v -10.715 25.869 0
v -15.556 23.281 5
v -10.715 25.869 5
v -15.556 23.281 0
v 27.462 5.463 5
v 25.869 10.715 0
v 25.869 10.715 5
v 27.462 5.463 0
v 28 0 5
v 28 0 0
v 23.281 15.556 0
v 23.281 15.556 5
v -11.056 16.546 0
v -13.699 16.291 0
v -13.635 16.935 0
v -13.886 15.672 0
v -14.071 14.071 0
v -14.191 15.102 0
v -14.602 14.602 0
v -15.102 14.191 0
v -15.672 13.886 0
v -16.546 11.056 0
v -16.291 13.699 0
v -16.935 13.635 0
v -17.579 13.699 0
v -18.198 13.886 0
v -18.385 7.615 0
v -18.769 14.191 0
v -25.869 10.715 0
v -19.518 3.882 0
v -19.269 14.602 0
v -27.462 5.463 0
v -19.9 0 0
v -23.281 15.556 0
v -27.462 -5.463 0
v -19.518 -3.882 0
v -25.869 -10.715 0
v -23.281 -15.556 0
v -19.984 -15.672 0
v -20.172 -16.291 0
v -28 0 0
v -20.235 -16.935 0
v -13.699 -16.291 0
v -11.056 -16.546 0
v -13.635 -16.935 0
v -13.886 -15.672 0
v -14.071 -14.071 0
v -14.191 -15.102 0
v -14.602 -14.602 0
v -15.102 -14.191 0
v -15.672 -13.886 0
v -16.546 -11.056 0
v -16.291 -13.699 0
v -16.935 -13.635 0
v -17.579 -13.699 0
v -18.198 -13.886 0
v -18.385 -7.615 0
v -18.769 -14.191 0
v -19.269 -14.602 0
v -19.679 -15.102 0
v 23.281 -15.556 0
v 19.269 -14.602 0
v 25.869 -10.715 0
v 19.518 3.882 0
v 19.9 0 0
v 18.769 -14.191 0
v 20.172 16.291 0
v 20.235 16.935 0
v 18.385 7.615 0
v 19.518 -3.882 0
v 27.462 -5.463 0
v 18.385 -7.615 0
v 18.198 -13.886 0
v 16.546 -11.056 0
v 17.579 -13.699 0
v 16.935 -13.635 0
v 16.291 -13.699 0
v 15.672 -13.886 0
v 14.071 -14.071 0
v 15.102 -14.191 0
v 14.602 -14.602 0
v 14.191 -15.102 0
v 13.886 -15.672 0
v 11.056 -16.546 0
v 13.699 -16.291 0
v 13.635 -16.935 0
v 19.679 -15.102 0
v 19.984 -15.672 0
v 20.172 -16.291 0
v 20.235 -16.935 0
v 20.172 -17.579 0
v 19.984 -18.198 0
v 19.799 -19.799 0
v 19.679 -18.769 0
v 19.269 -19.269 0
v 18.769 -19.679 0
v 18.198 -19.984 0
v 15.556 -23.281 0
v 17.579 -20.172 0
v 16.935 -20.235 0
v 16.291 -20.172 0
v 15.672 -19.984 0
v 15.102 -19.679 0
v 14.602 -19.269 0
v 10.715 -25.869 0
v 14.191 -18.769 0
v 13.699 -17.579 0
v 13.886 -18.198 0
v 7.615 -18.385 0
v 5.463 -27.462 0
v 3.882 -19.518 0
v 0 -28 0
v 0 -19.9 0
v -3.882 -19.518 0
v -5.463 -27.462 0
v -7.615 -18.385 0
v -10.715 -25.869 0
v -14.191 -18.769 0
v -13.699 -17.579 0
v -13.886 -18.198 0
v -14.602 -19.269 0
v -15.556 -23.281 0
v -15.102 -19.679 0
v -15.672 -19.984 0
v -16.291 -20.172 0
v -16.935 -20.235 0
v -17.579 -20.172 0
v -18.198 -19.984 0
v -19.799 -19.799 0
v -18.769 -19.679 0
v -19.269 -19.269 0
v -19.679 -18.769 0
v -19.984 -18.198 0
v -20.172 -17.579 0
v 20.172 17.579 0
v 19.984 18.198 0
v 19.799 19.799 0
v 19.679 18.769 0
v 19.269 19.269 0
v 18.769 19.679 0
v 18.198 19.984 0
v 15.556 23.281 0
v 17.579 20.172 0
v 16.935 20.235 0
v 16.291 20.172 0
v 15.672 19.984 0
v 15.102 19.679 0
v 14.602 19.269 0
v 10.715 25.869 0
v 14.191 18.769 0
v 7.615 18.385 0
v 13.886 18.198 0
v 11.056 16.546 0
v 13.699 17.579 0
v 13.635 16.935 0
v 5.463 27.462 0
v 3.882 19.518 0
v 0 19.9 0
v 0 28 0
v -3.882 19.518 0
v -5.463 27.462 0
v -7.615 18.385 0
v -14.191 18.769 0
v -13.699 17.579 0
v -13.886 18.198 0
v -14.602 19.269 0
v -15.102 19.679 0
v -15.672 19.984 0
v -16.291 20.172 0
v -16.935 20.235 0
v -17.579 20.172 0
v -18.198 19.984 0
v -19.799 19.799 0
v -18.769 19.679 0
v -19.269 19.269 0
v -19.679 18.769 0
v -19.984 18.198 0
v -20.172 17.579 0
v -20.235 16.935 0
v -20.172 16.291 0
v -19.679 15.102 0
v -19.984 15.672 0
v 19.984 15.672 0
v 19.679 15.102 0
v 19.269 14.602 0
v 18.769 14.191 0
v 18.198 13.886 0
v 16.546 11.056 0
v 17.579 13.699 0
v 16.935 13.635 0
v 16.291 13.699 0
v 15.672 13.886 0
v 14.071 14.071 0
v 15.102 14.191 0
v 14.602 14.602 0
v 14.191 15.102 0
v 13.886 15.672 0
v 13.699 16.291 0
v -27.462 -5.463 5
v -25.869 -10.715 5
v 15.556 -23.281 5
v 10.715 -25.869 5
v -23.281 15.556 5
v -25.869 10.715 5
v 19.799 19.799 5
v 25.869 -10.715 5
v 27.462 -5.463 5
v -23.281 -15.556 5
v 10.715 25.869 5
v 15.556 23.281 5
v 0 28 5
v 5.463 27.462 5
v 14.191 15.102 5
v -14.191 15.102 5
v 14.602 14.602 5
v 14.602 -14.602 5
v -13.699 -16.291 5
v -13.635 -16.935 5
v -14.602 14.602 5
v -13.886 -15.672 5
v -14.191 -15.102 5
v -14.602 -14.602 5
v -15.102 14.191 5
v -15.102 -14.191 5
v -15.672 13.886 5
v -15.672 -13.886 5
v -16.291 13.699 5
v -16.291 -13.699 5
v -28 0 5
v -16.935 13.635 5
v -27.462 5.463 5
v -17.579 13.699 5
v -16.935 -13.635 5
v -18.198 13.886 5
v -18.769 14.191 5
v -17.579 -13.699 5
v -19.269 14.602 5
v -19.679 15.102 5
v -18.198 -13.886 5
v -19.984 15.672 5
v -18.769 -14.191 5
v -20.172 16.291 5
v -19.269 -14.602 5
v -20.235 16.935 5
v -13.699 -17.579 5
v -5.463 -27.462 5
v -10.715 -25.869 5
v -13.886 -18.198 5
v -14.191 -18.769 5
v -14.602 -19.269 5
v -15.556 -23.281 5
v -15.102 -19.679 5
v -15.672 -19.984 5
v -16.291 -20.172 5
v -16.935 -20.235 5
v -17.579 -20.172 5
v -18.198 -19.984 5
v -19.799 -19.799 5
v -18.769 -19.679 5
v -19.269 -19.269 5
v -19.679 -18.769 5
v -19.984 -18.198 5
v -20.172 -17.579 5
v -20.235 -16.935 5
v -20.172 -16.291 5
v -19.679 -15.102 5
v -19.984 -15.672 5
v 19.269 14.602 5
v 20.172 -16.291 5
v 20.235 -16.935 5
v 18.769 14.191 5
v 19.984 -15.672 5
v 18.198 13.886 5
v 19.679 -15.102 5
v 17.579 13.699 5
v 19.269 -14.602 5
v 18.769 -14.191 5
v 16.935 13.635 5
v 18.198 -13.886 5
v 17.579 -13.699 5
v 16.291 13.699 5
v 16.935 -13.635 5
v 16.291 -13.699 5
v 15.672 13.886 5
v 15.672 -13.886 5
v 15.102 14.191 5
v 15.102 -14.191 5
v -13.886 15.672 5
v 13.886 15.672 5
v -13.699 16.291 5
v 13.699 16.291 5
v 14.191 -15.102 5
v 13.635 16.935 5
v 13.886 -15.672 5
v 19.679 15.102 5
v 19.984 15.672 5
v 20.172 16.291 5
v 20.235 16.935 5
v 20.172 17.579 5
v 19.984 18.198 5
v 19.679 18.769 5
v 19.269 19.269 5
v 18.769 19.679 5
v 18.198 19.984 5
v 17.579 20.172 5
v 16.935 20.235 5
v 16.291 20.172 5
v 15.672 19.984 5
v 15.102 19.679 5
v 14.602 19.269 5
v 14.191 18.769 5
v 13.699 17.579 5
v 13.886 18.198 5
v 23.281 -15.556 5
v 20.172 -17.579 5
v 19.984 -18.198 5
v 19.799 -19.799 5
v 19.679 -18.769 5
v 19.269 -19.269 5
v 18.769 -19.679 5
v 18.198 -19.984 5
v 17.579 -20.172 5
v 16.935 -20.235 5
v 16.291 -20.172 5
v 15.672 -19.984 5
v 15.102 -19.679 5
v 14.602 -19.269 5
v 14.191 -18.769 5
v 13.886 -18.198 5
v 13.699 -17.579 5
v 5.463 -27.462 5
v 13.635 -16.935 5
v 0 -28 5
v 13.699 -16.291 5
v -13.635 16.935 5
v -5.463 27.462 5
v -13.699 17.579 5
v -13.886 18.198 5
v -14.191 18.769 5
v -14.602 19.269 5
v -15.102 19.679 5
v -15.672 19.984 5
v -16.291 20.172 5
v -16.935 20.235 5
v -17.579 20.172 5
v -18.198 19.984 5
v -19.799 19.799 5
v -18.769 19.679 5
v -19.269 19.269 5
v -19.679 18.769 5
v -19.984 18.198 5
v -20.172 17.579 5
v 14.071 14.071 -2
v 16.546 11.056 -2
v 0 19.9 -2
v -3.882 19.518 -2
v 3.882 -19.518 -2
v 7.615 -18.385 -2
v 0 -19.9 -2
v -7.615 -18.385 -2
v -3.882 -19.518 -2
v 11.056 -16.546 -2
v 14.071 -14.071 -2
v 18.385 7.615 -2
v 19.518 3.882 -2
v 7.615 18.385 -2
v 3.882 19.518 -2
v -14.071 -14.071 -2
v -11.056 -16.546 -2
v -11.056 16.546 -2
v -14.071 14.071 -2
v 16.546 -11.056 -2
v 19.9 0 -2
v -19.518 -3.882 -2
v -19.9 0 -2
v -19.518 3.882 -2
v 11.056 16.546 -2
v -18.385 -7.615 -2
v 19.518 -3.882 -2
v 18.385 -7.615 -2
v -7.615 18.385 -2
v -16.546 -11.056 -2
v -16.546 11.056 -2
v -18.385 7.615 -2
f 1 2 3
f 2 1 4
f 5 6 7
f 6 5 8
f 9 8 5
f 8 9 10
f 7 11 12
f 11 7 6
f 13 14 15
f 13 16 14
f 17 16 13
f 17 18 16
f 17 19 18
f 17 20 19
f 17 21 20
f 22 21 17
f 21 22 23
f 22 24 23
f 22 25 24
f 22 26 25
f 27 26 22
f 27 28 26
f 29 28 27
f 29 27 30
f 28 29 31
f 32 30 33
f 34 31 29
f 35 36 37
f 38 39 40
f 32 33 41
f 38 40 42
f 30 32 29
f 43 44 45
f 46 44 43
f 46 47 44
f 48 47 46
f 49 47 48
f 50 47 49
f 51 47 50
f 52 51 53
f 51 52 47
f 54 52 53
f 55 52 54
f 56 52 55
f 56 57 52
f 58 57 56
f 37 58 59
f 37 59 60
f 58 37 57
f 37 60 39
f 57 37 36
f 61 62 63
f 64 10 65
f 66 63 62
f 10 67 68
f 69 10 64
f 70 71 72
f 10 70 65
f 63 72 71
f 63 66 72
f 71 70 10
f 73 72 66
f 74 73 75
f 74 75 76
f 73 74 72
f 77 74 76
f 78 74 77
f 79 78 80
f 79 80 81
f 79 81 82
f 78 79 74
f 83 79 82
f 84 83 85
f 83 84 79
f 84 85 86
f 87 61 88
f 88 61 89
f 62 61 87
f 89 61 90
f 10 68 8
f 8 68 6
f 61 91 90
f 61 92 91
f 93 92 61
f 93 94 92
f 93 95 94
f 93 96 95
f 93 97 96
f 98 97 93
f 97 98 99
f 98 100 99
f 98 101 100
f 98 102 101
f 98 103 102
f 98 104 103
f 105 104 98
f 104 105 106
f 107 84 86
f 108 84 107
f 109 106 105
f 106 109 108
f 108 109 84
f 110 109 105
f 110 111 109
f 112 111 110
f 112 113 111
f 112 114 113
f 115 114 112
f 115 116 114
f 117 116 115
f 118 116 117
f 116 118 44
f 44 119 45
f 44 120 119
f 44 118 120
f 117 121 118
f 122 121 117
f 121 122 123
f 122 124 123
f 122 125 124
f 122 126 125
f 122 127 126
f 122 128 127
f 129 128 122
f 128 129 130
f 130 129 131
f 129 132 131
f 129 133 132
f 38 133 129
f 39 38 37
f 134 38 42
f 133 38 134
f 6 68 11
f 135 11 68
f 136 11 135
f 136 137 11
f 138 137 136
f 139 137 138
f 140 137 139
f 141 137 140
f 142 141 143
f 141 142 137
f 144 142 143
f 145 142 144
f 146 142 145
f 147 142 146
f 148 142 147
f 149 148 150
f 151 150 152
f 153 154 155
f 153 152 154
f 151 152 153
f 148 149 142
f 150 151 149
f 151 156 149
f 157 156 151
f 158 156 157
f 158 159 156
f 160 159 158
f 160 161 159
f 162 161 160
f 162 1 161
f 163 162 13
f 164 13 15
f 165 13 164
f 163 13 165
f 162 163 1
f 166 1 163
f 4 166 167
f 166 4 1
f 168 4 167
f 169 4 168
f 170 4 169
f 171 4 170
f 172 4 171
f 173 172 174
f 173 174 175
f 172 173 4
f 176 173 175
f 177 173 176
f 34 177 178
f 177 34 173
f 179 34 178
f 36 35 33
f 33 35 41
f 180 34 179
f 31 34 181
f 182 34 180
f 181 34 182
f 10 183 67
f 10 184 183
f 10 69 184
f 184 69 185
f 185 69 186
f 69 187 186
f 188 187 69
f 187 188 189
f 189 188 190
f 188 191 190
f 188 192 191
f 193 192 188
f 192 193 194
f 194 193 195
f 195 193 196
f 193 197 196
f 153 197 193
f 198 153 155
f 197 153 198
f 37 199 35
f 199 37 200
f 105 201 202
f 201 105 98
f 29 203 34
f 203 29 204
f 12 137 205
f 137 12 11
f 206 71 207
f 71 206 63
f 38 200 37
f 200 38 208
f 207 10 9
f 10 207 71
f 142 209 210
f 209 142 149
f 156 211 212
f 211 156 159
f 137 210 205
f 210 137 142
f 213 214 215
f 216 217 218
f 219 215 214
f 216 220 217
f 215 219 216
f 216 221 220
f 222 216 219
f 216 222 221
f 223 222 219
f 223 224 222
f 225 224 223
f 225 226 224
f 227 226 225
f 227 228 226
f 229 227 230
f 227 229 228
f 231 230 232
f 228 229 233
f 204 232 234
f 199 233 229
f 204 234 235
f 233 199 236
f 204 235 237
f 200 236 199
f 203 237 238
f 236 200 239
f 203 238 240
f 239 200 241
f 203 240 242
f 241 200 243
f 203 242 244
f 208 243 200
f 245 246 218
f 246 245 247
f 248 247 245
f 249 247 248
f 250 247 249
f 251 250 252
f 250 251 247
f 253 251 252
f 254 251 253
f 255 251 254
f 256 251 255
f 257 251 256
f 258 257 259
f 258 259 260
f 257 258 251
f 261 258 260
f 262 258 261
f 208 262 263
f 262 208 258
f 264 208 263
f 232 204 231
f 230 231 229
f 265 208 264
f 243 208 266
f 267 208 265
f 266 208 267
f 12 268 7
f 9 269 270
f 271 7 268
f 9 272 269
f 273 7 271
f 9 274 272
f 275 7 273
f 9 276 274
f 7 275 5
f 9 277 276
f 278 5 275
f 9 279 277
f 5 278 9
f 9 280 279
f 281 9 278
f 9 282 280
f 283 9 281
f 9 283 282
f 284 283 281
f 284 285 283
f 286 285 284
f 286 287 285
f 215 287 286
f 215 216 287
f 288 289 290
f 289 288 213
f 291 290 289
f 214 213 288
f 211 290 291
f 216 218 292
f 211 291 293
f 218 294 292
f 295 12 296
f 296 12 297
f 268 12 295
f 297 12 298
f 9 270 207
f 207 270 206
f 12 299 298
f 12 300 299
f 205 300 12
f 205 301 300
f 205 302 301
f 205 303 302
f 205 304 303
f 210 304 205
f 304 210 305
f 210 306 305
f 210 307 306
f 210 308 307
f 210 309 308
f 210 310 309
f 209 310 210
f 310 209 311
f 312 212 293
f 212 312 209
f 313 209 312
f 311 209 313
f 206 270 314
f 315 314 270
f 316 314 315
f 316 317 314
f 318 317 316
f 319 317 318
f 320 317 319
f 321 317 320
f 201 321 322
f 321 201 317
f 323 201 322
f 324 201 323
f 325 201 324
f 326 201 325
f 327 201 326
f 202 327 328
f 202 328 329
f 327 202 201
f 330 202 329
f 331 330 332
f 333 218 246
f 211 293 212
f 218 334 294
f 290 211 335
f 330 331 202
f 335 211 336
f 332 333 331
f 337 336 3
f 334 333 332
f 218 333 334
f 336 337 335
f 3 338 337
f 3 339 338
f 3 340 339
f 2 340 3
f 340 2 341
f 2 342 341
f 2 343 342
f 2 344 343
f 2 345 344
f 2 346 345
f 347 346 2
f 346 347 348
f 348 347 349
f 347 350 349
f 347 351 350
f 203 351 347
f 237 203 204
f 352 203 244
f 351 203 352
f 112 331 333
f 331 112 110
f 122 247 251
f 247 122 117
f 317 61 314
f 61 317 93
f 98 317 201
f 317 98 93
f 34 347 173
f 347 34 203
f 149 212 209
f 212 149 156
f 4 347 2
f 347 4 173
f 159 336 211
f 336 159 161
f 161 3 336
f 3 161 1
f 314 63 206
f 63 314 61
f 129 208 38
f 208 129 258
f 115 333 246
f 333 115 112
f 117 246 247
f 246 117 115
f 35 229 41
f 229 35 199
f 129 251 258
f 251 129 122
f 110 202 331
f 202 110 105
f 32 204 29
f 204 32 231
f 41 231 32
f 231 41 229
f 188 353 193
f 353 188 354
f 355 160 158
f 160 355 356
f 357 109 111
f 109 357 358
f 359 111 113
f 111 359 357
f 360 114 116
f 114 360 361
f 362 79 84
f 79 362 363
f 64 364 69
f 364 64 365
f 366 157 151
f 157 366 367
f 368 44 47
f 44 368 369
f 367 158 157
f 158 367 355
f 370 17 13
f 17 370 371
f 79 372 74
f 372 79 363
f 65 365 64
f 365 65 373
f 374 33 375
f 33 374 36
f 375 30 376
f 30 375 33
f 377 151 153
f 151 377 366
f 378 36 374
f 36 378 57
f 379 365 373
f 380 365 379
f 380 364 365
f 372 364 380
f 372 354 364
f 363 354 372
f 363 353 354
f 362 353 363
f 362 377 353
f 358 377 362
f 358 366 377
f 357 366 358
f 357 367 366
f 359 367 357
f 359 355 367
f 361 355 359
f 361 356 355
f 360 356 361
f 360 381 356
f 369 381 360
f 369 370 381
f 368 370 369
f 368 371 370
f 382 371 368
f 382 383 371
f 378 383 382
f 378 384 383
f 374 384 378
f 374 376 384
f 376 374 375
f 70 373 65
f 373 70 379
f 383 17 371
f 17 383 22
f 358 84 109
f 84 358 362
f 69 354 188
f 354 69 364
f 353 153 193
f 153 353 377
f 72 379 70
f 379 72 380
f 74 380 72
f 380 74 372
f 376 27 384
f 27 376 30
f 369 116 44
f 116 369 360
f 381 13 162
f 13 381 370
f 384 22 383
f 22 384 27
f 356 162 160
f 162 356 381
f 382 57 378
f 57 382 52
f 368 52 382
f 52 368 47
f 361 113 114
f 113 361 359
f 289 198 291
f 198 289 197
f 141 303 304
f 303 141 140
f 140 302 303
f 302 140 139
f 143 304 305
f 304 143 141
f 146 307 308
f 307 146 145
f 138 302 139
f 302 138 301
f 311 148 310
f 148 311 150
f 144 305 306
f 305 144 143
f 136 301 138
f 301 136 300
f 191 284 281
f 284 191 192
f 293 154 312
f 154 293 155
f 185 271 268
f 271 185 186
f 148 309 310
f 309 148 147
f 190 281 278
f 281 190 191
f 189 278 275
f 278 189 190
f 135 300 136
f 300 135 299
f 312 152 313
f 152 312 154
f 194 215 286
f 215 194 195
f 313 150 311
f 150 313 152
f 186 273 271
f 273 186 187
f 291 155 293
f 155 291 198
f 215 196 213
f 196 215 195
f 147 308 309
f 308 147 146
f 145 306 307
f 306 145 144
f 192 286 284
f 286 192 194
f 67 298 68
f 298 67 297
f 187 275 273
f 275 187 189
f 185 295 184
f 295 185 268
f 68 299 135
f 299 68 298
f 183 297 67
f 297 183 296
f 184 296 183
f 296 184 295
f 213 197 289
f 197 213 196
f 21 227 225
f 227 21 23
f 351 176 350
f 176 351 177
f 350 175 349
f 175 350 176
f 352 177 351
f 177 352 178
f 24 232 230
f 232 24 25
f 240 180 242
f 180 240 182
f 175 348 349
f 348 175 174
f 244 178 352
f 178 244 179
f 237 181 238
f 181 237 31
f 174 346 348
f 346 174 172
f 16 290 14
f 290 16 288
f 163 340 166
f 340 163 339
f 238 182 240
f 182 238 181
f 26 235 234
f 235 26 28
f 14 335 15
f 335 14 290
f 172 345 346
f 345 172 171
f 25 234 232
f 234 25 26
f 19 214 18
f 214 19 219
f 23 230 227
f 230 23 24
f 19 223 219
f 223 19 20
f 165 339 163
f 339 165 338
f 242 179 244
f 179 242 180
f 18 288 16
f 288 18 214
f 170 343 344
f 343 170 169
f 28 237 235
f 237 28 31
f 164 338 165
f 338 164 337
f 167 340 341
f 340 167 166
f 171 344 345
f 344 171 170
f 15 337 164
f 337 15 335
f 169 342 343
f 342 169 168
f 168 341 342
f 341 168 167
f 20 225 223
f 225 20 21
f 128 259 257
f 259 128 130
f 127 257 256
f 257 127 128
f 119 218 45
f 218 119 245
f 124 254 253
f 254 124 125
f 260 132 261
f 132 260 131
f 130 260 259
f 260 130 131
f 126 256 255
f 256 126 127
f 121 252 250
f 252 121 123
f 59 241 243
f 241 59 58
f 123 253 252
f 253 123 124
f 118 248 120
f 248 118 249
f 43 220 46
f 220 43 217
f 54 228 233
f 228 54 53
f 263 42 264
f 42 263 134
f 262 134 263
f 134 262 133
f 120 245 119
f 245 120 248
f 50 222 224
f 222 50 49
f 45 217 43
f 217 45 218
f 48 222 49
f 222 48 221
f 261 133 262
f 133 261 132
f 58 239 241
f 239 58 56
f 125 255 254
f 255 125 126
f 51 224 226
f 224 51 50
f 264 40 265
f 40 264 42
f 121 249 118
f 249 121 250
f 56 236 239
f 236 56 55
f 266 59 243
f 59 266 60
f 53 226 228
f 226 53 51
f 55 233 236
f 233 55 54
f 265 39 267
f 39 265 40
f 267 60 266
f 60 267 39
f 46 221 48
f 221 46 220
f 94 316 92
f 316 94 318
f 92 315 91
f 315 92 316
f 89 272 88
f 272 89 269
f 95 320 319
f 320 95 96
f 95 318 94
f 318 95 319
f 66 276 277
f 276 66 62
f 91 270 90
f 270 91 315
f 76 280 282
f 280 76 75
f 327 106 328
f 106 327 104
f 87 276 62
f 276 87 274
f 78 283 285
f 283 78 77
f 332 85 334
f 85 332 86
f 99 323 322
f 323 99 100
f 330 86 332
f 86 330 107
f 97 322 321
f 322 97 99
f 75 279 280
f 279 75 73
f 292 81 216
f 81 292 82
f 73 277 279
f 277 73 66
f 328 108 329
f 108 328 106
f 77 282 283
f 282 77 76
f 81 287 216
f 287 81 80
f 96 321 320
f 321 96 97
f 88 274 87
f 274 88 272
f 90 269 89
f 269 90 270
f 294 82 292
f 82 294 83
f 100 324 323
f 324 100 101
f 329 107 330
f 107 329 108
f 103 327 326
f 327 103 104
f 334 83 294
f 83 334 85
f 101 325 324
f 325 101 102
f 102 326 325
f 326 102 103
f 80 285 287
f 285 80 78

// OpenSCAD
$fn = 32;

// ----------------------------------------------------------------------
// Retaining cap: 6203 cover, 56 mm, spigot 39.8 mm
// ----------------------------------------------------------------------

// --- parameters (mm) ---
cover_d = 56;             // cover diameter
cover_t = 5;              // cover thickness
spigot_d = 39.8;          // spigot that enters the housing
spigot_h = 2;             // spigot height
bolt_d = 6.6;             // bolt clearance
bolt_r = 23.95;           // bolt circle radius

module cover() {
  cylinder(h = cover_t, d = cover_d);
}

module spigot() {
  /* sunk 1 mm into the cover; the spigot sets the overall height */
  translate([0, 0, -spigot_h]) cylinder(h = spigot_h + 1, d = spigot_d);
}

difference() {
  union() {
    cover();
    spigot();
  }
  for (i = [0 : 3]) rotate([0, 0, 45 + i * 90]) translate([bolt_r, 0, -spigot_h - 1])
    cylinder(h = spigot_h + cover_t + 2, d = bolt_d);
}
